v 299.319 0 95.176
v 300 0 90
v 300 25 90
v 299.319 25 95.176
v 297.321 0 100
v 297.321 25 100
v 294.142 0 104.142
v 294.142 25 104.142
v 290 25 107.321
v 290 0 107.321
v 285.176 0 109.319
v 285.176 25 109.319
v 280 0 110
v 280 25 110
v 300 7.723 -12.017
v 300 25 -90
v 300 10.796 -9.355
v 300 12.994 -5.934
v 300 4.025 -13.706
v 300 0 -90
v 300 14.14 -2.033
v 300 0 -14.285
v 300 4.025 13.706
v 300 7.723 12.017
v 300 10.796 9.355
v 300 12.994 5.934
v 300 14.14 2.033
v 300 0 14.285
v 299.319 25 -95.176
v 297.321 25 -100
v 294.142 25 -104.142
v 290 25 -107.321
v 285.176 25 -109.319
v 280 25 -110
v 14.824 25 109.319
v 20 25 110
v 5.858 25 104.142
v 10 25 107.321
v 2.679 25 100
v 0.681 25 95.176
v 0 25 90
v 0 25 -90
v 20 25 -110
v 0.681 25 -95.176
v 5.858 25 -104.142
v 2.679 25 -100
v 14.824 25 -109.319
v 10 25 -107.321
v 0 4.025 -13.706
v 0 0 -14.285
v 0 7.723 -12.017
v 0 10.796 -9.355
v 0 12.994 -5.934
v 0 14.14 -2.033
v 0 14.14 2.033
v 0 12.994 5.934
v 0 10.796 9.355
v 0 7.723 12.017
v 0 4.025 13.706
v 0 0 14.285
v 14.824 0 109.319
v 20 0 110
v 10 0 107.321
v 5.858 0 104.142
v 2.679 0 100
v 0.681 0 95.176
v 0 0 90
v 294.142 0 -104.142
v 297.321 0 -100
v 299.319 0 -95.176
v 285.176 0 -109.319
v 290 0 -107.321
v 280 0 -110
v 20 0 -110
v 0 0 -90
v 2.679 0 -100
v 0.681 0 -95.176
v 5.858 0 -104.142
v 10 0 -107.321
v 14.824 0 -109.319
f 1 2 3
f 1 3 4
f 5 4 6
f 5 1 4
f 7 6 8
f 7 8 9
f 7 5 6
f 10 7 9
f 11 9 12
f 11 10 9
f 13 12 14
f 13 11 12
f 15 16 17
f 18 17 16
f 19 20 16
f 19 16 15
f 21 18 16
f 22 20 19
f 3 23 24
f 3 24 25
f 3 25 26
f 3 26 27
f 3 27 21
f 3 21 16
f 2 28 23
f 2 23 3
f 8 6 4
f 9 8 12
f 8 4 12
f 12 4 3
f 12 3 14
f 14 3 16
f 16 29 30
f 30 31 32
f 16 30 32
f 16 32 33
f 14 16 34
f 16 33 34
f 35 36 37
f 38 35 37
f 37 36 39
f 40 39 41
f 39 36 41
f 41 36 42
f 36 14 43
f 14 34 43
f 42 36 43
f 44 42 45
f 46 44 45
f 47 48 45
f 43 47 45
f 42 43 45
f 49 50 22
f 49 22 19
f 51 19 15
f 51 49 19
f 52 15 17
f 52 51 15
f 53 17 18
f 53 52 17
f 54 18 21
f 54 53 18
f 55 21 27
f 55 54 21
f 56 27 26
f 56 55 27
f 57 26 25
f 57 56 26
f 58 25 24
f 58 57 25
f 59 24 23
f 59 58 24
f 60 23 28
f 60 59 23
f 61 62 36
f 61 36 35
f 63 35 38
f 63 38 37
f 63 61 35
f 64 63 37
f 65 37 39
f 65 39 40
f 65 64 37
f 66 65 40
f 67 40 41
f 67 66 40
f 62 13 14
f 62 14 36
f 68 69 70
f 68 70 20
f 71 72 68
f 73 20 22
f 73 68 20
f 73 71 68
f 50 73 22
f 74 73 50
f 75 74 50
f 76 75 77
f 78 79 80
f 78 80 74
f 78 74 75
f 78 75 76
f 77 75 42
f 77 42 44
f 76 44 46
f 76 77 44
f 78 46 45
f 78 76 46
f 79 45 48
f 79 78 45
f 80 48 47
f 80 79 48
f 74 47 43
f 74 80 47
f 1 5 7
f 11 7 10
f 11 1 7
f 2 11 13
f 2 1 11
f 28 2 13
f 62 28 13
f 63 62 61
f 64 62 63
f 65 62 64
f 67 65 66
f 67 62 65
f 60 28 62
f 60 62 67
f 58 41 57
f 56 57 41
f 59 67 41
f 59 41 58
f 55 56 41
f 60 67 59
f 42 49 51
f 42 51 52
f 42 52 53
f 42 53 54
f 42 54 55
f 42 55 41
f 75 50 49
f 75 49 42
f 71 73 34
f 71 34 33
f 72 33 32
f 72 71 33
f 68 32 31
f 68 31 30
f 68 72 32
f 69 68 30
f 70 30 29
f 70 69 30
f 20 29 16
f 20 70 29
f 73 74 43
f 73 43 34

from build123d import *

# Parameters (mm, degrees)
BOSS_EXTRUDE1_DEPTH = 25
SKETCH2_R           = 14.285
CUT_EXTRUDE1_DEPTH  = 321.507410211


with BuildPart() as part:
    # Sketch1 → Boss-Extrude1 (new body)
    with BuildSketch(Plane(origin=(0, 0, 0), x_dir=(1, 0, 0), z_dir=(0, 1, 0))):
        with BuildLine():
            Line((0, 0), (0, 90))
            ThreePointArc((0, 90), (5.857864376, 104.142135624), (20, 110))
            Line((20, 110), (280, 110))
            ThreePointArc((280, 110), (294.142135624, 104.142135624), (300, 90))
            Line((300, 90), (300, 0))
            Line((300, 0), (300, -90))
            ThreePointArc((300, -90), (294.142135624, -104.142135624), (280, -110))
            Line((280, -110), (20, -110))
            ThreePointArc((20, -110), (5.857864376, -104.142135624), (0, -90))
            Line((0, -90), (0, 0))
        make_face()
    extrude(amount=BOSS_EXTRUDE1_DEPTH)

    # Sketch2 → Cut-Extrude1 (cut, through all)
    with BuildSketch(Plane(origin=(0, 0, 0), x_dir=(0, 0, -1), z_dir=(1, 0, 0))):
        Circle(SKETCH2_R)
    extrude(amount=CUT_EXTRUDE1_DEPTH, mode=Mode.SUBTRACT)


solid = part.part
